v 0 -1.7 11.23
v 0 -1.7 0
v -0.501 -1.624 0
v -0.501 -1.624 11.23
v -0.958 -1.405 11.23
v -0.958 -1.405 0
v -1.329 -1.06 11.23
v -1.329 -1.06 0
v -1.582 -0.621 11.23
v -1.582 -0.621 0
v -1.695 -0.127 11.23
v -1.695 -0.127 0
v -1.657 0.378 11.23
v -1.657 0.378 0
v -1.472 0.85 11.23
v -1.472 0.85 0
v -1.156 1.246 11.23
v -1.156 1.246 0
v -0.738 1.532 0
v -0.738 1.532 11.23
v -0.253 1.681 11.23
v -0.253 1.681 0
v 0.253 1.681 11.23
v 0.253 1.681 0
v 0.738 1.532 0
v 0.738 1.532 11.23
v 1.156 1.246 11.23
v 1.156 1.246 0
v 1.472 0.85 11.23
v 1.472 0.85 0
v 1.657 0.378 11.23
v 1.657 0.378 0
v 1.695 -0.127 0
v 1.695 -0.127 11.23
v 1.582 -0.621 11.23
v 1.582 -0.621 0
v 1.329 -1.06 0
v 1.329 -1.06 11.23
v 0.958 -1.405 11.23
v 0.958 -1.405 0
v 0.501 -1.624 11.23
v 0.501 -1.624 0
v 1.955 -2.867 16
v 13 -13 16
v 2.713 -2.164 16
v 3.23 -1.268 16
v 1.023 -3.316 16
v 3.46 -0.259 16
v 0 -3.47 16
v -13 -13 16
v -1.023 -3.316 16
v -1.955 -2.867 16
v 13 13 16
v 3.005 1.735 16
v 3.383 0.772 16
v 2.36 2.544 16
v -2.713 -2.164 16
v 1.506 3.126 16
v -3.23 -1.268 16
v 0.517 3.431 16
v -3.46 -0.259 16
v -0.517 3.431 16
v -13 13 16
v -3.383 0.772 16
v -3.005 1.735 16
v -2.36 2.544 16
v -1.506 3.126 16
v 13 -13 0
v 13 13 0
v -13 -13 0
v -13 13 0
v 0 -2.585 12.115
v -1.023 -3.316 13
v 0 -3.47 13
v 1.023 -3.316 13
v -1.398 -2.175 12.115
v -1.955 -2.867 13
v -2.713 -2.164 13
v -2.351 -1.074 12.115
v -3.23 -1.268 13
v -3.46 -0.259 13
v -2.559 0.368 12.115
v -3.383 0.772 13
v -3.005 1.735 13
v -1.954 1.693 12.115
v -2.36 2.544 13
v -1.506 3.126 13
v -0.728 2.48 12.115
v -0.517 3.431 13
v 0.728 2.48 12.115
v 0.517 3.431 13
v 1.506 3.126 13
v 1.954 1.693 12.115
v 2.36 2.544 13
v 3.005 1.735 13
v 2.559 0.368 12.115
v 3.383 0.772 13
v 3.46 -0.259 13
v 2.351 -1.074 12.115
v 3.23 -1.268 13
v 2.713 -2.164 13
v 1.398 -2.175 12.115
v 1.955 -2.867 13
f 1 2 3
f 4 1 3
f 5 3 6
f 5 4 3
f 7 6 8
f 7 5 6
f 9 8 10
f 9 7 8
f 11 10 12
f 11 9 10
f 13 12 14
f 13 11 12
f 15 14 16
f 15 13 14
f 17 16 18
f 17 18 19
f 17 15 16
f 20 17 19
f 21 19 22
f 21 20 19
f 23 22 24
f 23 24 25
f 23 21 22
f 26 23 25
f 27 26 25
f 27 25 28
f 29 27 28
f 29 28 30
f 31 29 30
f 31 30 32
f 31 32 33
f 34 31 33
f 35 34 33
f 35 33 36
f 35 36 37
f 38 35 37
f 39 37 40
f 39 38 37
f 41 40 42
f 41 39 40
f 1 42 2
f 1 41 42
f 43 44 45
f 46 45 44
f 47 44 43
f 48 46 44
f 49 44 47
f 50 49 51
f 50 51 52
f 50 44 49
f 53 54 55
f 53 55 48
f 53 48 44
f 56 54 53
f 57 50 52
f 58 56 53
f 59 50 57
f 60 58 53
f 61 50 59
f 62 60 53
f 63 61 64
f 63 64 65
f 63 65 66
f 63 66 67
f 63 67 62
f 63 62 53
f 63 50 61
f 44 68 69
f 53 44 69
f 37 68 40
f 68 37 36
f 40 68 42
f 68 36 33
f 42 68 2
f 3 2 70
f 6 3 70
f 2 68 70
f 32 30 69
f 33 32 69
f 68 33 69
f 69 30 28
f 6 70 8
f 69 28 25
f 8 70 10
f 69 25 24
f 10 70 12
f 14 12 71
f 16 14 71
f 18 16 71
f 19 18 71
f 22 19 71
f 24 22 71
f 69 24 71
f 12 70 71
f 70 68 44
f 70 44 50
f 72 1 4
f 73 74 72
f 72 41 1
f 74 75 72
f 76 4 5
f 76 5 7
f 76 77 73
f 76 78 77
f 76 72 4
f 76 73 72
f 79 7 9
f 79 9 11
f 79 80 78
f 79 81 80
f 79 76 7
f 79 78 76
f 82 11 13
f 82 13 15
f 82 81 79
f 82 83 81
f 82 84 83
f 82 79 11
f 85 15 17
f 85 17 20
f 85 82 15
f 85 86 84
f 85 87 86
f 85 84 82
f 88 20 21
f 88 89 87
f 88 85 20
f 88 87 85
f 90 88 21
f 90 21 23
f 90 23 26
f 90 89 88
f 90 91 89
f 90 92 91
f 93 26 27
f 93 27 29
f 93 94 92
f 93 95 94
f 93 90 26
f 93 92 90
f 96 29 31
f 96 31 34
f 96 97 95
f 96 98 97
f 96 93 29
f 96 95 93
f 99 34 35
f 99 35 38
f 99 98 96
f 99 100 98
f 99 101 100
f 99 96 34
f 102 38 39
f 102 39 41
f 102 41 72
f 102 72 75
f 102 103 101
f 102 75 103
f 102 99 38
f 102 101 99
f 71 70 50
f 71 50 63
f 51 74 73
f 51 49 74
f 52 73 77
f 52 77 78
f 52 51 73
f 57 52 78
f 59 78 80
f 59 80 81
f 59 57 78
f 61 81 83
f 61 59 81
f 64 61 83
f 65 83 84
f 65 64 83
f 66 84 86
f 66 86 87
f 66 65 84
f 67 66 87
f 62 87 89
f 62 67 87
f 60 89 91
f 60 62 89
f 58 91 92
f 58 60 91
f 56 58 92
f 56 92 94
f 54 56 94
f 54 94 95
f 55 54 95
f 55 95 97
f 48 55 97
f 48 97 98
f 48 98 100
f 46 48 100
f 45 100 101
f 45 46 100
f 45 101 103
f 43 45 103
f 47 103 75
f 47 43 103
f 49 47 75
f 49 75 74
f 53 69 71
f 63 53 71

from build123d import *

# Parameters (mm, degrees)
SKIZZE2_W                       = 26
SKIZZE2_H                       = 26
AUFSATZ_LINEAR_AUSTRAGEN1_DEPTH = 16


with BuildPart() as part:
    # Skizze2 → Aufsatz-Linear austragen1 (new body)
    with BuildSketch(Plane(origin=(0, 0, 0), x_dir=(0, 1, 0), z_dir=(0, 0, 1))):
        Rectangle(SKIZZE2_W, SKIZZE2_H)
    extrude(amount=AUFSATZ_LINEAR_AUSTRAGEN1_DEPTH)

    # Skizze5 → Formsenkung für M3 Senkschraube mit Innensechskant1 (revolve, cut)
    with BuildSketch(Plane(origin=(0, 0, 16), x_dir=(0, -1, 0), z_dir=(1, 0, 0))):
        Polygon((0, 0), (0, 16), (1.7, 16), (1.7, 4.77), (3.47, 3), (3.47, 0), align=None)
    revolve(axis=Axis((0, 0, 22.35), (0, 0, -1)), mode=Mode.SUBTRACT)


solid = part.part
